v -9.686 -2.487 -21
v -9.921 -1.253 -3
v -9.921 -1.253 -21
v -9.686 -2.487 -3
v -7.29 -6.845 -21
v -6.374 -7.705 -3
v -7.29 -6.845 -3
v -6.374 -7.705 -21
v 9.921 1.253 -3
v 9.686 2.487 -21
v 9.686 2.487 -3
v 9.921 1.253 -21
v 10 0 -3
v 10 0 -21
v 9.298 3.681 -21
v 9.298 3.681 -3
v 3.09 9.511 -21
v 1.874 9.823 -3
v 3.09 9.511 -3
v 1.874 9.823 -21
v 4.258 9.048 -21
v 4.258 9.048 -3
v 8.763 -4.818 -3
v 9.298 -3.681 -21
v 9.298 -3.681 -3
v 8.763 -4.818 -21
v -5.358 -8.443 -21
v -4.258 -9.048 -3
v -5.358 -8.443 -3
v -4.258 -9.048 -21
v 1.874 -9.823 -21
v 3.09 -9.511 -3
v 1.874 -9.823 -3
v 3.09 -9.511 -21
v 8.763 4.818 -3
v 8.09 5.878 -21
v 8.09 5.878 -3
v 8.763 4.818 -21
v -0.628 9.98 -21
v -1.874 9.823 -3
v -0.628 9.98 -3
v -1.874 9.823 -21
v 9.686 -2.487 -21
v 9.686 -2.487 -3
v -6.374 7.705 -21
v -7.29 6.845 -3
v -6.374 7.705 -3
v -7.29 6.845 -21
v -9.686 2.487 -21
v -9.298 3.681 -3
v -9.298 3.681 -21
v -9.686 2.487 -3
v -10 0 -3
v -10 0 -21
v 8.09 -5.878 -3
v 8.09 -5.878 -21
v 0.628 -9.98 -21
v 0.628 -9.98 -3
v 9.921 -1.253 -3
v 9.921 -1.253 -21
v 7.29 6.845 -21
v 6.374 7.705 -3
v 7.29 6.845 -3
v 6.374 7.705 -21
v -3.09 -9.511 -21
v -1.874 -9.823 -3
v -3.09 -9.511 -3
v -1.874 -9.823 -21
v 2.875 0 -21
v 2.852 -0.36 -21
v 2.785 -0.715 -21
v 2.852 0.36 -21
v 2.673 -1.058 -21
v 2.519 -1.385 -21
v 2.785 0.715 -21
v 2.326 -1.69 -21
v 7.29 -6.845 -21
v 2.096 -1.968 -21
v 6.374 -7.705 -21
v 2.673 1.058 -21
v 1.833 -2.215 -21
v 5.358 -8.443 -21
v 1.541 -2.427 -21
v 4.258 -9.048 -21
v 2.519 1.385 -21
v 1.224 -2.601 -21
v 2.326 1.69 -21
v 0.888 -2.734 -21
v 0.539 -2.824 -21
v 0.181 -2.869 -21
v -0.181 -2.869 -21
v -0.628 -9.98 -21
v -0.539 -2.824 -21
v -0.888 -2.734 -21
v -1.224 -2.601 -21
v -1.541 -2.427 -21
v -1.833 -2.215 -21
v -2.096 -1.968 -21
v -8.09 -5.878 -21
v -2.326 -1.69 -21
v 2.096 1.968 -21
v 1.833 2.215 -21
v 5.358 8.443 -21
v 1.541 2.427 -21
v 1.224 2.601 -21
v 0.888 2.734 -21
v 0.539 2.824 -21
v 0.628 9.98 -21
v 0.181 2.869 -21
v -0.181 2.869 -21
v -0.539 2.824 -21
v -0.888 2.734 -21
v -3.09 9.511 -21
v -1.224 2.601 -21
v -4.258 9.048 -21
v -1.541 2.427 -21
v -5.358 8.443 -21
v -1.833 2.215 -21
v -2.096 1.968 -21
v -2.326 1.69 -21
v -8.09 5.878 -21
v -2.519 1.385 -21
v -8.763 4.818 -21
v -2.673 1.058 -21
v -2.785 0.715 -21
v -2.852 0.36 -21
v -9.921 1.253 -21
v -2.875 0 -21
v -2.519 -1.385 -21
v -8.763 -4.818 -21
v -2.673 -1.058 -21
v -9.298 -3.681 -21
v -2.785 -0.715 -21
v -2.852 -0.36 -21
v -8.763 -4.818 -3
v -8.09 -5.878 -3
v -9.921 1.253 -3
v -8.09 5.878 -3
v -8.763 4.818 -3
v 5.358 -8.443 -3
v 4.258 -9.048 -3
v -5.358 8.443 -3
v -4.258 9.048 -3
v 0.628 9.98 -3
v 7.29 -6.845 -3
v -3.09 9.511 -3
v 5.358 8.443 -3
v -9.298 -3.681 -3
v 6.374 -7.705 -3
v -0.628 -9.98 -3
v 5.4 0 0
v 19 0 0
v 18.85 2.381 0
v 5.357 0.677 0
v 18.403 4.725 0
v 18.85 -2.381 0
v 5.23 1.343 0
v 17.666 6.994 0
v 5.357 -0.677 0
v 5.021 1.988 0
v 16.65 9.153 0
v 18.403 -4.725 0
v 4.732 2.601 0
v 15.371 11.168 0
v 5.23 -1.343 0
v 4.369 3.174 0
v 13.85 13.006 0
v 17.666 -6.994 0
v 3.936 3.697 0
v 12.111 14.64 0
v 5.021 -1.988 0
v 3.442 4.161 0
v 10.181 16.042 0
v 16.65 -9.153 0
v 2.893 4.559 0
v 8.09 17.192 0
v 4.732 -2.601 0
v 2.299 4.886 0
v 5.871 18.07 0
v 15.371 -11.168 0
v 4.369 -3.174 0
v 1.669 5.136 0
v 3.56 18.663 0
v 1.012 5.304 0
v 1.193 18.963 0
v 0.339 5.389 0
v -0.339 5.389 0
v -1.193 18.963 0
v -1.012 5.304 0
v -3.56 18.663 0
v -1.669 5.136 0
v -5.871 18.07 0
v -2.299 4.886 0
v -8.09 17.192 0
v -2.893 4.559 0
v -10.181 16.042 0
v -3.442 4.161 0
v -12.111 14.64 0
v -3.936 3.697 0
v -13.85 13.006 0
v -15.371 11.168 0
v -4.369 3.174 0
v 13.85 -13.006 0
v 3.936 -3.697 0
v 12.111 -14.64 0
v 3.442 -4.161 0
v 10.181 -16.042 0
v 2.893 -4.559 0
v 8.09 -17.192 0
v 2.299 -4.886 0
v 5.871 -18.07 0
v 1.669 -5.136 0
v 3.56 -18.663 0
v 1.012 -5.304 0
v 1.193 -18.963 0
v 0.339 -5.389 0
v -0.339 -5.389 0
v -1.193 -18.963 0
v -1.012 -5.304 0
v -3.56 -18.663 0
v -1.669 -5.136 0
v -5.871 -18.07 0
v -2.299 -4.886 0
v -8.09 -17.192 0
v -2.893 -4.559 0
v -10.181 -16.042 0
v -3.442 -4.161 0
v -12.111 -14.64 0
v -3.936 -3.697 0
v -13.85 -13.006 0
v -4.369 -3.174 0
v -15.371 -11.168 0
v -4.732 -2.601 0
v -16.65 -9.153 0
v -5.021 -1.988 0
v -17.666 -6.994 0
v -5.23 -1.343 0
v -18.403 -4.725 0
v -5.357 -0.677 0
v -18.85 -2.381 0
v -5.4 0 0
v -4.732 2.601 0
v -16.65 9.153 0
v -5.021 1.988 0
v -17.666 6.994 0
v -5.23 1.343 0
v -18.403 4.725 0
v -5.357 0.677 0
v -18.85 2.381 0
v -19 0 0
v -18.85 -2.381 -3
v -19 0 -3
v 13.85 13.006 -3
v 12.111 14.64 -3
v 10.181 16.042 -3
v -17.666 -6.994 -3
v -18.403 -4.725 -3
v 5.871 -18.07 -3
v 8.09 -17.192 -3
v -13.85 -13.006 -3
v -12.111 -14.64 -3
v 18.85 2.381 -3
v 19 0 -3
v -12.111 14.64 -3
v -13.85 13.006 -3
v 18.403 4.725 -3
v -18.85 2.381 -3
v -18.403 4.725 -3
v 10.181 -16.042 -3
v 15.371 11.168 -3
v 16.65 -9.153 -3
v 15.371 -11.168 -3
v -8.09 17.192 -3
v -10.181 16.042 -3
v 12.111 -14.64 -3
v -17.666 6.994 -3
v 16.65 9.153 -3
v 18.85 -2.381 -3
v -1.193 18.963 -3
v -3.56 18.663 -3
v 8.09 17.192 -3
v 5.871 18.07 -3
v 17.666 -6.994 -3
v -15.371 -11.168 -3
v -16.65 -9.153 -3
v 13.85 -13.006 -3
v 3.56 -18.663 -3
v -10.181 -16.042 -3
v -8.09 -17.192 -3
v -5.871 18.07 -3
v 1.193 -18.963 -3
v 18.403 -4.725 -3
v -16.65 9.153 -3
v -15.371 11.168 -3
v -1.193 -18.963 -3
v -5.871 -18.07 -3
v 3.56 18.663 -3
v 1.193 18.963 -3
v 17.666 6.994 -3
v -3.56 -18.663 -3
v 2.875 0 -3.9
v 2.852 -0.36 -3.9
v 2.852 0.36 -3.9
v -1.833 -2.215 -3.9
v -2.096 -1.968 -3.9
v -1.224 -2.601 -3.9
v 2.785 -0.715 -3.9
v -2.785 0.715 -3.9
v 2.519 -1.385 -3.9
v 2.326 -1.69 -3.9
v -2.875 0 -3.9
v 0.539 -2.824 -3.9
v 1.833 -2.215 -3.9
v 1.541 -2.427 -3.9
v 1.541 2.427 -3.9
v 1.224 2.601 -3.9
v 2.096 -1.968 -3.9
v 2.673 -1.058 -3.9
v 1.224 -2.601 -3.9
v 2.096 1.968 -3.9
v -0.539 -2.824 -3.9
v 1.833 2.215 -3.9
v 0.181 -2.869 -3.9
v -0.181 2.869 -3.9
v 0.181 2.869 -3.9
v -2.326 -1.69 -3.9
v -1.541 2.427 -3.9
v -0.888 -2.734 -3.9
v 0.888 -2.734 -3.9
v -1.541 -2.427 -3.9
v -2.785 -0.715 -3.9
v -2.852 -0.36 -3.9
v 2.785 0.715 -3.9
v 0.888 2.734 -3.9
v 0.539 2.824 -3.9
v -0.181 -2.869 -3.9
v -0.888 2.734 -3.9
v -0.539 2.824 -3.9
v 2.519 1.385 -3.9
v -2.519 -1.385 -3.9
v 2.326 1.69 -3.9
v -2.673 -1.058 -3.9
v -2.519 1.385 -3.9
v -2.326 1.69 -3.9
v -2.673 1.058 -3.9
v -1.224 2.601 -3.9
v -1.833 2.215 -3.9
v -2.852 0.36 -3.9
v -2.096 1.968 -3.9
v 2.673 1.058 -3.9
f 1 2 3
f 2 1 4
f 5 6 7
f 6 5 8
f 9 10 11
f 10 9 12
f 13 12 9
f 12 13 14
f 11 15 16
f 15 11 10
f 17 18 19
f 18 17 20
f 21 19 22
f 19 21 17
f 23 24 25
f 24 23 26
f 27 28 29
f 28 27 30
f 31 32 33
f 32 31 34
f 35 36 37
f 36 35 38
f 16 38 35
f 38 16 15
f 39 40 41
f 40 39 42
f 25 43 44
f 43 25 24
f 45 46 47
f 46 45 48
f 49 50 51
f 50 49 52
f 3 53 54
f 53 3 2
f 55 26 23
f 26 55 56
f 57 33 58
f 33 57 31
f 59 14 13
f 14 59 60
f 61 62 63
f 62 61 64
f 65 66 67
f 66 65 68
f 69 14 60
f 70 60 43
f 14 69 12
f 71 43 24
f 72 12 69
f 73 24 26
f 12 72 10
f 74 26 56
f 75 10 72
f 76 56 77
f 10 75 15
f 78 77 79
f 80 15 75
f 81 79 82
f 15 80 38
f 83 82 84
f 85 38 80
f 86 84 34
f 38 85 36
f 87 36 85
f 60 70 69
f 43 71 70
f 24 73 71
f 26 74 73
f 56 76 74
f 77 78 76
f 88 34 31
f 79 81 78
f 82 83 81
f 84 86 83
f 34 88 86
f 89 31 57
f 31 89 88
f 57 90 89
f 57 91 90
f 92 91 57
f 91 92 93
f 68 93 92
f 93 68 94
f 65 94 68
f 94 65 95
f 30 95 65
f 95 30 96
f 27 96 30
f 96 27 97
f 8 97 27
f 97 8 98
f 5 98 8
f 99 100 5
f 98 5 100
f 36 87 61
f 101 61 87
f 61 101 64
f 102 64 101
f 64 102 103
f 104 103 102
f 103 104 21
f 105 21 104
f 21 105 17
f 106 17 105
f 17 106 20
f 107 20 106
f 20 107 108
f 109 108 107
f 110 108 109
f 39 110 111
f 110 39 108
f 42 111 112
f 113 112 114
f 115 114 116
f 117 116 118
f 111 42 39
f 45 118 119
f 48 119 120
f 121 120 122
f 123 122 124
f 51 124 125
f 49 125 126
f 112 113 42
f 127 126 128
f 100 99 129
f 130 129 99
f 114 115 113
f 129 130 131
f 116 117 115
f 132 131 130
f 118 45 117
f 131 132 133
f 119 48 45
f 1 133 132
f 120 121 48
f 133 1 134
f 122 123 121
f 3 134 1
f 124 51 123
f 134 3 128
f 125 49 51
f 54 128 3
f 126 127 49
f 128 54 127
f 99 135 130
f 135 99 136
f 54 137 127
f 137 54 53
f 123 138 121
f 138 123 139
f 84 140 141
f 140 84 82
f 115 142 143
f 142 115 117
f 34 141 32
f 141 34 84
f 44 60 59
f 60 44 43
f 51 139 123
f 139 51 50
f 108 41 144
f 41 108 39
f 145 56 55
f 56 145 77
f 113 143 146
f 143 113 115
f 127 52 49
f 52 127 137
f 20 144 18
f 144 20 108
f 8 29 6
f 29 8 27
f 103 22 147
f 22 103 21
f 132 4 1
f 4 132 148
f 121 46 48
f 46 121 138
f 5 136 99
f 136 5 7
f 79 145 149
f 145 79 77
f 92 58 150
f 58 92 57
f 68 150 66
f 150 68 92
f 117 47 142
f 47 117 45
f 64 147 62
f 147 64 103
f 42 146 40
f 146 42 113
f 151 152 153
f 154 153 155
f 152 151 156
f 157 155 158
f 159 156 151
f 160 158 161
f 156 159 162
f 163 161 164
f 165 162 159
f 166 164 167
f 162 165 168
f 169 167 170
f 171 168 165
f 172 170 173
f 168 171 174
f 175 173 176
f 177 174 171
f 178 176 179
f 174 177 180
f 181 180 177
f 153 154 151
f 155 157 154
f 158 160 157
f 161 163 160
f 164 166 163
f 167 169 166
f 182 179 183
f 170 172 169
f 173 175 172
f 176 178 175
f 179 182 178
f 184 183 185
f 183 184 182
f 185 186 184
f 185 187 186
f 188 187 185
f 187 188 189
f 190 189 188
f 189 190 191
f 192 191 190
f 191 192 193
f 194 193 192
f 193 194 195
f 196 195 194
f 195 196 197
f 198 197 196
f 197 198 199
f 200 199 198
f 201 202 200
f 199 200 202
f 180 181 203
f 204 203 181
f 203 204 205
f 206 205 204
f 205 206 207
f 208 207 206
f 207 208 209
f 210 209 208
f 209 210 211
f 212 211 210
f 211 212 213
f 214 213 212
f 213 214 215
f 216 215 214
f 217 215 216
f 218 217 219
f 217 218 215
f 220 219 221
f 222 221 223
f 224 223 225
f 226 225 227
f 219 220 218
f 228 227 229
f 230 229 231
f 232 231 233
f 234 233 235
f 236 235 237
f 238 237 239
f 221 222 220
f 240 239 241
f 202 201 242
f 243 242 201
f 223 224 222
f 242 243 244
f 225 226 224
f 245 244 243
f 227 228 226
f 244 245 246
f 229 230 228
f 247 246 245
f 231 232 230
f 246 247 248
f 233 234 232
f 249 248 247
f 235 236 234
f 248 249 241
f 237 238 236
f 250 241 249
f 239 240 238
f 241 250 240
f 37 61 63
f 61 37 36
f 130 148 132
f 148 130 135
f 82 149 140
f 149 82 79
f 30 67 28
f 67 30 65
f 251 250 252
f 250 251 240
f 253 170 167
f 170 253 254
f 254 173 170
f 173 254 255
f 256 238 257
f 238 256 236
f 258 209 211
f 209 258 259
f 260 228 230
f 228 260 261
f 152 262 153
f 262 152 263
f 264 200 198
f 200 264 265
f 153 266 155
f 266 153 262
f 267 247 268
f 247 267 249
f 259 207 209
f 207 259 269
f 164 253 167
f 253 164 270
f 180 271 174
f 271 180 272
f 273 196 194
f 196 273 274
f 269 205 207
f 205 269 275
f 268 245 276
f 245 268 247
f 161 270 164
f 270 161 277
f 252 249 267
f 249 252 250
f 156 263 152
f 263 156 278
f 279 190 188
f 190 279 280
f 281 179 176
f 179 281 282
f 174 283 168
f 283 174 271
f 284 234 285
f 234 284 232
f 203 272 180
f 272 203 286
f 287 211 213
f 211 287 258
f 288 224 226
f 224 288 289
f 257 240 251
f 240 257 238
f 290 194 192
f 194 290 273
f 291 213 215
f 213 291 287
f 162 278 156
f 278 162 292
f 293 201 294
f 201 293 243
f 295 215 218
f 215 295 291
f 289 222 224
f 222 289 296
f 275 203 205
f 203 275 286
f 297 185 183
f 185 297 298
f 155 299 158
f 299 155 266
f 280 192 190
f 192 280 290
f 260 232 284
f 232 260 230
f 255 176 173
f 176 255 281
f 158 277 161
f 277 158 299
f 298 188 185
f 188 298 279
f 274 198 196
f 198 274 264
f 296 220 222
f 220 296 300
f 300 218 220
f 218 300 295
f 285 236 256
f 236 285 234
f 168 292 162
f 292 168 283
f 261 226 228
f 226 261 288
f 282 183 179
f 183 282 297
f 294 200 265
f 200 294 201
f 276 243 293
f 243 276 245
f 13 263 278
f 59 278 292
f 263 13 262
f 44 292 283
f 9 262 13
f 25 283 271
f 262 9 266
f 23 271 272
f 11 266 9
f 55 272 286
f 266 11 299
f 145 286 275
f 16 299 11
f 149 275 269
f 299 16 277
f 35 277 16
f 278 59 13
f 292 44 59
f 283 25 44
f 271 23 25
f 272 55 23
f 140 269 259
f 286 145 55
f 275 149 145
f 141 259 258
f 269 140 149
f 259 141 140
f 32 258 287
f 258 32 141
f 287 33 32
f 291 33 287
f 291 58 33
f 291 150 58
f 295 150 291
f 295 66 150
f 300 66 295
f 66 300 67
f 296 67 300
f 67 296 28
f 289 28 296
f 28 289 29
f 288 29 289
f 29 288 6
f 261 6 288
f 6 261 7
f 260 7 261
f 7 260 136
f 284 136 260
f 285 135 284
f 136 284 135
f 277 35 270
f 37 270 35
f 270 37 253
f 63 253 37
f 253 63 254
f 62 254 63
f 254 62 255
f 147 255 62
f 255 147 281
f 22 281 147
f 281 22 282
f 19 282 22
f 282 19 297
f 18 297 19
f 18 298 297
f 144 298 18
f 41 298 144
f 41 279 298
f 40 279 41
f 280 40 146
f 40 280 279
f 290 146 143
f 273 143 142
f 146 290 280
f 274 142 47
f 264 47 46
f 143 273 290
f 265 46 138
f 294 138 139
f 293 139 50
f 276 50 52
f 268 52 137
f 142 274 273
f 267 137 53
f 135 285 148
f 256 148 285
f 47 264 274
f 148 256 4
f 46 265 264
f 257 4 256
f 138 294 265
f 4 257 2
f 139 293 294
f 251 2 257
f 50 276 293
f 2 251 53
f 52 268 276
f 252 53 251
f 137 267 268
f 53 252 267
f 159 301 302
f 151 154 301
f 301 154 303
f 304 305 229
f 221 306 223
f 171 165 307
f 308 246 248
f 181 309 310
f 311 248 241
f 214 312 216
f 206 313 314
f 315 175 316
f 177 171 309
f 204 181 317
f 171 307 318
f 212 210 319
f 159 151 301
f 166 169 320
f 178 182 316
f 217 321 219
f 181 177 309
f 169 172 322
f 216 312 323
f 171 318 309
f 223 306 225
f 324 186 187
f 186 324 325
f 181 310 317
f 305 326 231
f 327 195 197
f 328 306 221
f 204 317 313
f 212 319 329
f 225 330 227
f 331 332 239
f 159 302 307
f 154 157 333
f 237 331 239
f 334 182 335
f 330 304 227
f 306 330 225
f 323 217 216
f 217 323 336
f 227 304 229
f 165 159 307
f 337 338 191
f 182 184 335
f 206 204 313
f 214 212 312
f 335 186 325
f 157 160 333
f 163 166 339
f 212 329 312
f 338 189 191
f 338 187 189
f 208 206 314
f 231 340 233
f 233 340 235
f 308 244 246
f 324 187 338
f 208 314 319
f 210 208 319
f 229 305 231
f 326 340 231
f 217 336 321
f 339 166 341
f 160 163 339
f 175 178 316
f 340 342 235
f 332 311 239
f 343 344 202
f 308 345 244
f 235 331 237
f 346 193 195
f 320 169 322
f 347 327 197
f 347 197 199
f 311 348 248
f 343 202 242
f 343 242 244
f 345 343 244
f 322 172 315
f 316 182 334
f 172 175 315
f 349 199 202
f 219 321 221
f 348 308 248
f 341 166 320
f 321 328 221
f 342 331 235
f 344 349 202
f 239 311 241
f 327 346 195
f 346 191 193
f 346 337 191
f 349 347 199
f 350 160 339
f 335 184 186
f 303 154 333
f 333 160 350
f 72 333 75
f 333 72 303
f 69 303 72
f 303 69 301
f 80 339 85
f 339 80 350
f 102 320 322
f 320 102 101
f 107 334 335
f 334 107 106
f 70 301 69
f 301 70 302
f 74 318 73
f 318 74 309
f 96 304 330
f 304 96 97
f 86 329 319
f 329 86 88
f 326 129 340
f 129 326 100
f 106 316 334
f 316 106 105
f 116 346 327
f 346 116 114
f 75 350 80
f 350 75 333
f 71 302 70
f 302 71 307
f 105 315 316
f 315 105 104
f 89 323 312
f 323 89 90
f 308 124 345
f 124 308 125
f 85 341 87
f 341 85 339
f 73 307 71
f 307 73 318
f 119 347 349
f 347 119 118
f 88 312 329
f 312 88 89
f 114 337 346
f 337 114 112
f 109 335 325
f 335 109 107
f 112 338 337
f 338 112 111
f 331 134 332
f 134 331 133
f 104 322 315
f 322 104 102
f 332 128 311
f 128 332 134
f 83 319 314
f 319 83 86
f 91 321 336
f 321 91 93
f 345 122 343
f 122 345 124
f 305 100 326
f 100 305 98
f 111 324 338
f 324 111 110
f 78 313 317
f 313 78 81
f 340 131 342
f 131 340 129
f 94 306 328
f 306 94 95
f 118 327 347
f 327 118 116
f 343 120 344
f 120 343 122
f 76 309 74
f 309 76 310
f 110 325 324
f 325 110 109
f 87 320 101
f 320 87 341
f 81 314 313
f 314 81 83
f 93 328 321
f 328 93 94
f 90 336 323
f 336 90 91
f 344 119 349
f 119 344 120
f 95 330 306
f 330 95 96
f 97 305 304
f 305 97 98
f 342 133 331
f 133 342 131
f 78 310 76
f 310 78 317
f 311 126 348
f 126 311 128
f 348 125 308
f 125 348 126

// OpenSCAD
$fn = 50;


difference() {
	union() {
		translate(v = [0, 0, -21.0000000000]) {
			cylinder(h = 21, r = 10.0000000000);
		}
		translate(v = [0, 0, -3.0000000000]) {
			cylinder(h = 3, r = 19.0000000000);
		}
	}
	union() {
		translate(v = [0, 0, 0]) {
			rotate(a = [0, 0, 0]) {
				difference() {
					union() {
						#translate(v = [0, 0, -21.0000000000]) {
							cylinder(h = 21, r = 2.6000000000);
						}
						#translate(v = [0, 0, -3.9000000000]) {
							cylinder(h = 3.9000000000, r1 = 2.8750000000, r2 = 5.4000000000);
						}
						#translate(v = [0, 0, -21.0000000000]) {
							cylinder(h = 21, r = 2.8750000000);
						}
						#translate(v = [0, 0, -21.0000000000]) {
							cylinder(h = 21, r = 2.6000000000);
						}
					}
					union();
				}
			}
		}
	}
}
